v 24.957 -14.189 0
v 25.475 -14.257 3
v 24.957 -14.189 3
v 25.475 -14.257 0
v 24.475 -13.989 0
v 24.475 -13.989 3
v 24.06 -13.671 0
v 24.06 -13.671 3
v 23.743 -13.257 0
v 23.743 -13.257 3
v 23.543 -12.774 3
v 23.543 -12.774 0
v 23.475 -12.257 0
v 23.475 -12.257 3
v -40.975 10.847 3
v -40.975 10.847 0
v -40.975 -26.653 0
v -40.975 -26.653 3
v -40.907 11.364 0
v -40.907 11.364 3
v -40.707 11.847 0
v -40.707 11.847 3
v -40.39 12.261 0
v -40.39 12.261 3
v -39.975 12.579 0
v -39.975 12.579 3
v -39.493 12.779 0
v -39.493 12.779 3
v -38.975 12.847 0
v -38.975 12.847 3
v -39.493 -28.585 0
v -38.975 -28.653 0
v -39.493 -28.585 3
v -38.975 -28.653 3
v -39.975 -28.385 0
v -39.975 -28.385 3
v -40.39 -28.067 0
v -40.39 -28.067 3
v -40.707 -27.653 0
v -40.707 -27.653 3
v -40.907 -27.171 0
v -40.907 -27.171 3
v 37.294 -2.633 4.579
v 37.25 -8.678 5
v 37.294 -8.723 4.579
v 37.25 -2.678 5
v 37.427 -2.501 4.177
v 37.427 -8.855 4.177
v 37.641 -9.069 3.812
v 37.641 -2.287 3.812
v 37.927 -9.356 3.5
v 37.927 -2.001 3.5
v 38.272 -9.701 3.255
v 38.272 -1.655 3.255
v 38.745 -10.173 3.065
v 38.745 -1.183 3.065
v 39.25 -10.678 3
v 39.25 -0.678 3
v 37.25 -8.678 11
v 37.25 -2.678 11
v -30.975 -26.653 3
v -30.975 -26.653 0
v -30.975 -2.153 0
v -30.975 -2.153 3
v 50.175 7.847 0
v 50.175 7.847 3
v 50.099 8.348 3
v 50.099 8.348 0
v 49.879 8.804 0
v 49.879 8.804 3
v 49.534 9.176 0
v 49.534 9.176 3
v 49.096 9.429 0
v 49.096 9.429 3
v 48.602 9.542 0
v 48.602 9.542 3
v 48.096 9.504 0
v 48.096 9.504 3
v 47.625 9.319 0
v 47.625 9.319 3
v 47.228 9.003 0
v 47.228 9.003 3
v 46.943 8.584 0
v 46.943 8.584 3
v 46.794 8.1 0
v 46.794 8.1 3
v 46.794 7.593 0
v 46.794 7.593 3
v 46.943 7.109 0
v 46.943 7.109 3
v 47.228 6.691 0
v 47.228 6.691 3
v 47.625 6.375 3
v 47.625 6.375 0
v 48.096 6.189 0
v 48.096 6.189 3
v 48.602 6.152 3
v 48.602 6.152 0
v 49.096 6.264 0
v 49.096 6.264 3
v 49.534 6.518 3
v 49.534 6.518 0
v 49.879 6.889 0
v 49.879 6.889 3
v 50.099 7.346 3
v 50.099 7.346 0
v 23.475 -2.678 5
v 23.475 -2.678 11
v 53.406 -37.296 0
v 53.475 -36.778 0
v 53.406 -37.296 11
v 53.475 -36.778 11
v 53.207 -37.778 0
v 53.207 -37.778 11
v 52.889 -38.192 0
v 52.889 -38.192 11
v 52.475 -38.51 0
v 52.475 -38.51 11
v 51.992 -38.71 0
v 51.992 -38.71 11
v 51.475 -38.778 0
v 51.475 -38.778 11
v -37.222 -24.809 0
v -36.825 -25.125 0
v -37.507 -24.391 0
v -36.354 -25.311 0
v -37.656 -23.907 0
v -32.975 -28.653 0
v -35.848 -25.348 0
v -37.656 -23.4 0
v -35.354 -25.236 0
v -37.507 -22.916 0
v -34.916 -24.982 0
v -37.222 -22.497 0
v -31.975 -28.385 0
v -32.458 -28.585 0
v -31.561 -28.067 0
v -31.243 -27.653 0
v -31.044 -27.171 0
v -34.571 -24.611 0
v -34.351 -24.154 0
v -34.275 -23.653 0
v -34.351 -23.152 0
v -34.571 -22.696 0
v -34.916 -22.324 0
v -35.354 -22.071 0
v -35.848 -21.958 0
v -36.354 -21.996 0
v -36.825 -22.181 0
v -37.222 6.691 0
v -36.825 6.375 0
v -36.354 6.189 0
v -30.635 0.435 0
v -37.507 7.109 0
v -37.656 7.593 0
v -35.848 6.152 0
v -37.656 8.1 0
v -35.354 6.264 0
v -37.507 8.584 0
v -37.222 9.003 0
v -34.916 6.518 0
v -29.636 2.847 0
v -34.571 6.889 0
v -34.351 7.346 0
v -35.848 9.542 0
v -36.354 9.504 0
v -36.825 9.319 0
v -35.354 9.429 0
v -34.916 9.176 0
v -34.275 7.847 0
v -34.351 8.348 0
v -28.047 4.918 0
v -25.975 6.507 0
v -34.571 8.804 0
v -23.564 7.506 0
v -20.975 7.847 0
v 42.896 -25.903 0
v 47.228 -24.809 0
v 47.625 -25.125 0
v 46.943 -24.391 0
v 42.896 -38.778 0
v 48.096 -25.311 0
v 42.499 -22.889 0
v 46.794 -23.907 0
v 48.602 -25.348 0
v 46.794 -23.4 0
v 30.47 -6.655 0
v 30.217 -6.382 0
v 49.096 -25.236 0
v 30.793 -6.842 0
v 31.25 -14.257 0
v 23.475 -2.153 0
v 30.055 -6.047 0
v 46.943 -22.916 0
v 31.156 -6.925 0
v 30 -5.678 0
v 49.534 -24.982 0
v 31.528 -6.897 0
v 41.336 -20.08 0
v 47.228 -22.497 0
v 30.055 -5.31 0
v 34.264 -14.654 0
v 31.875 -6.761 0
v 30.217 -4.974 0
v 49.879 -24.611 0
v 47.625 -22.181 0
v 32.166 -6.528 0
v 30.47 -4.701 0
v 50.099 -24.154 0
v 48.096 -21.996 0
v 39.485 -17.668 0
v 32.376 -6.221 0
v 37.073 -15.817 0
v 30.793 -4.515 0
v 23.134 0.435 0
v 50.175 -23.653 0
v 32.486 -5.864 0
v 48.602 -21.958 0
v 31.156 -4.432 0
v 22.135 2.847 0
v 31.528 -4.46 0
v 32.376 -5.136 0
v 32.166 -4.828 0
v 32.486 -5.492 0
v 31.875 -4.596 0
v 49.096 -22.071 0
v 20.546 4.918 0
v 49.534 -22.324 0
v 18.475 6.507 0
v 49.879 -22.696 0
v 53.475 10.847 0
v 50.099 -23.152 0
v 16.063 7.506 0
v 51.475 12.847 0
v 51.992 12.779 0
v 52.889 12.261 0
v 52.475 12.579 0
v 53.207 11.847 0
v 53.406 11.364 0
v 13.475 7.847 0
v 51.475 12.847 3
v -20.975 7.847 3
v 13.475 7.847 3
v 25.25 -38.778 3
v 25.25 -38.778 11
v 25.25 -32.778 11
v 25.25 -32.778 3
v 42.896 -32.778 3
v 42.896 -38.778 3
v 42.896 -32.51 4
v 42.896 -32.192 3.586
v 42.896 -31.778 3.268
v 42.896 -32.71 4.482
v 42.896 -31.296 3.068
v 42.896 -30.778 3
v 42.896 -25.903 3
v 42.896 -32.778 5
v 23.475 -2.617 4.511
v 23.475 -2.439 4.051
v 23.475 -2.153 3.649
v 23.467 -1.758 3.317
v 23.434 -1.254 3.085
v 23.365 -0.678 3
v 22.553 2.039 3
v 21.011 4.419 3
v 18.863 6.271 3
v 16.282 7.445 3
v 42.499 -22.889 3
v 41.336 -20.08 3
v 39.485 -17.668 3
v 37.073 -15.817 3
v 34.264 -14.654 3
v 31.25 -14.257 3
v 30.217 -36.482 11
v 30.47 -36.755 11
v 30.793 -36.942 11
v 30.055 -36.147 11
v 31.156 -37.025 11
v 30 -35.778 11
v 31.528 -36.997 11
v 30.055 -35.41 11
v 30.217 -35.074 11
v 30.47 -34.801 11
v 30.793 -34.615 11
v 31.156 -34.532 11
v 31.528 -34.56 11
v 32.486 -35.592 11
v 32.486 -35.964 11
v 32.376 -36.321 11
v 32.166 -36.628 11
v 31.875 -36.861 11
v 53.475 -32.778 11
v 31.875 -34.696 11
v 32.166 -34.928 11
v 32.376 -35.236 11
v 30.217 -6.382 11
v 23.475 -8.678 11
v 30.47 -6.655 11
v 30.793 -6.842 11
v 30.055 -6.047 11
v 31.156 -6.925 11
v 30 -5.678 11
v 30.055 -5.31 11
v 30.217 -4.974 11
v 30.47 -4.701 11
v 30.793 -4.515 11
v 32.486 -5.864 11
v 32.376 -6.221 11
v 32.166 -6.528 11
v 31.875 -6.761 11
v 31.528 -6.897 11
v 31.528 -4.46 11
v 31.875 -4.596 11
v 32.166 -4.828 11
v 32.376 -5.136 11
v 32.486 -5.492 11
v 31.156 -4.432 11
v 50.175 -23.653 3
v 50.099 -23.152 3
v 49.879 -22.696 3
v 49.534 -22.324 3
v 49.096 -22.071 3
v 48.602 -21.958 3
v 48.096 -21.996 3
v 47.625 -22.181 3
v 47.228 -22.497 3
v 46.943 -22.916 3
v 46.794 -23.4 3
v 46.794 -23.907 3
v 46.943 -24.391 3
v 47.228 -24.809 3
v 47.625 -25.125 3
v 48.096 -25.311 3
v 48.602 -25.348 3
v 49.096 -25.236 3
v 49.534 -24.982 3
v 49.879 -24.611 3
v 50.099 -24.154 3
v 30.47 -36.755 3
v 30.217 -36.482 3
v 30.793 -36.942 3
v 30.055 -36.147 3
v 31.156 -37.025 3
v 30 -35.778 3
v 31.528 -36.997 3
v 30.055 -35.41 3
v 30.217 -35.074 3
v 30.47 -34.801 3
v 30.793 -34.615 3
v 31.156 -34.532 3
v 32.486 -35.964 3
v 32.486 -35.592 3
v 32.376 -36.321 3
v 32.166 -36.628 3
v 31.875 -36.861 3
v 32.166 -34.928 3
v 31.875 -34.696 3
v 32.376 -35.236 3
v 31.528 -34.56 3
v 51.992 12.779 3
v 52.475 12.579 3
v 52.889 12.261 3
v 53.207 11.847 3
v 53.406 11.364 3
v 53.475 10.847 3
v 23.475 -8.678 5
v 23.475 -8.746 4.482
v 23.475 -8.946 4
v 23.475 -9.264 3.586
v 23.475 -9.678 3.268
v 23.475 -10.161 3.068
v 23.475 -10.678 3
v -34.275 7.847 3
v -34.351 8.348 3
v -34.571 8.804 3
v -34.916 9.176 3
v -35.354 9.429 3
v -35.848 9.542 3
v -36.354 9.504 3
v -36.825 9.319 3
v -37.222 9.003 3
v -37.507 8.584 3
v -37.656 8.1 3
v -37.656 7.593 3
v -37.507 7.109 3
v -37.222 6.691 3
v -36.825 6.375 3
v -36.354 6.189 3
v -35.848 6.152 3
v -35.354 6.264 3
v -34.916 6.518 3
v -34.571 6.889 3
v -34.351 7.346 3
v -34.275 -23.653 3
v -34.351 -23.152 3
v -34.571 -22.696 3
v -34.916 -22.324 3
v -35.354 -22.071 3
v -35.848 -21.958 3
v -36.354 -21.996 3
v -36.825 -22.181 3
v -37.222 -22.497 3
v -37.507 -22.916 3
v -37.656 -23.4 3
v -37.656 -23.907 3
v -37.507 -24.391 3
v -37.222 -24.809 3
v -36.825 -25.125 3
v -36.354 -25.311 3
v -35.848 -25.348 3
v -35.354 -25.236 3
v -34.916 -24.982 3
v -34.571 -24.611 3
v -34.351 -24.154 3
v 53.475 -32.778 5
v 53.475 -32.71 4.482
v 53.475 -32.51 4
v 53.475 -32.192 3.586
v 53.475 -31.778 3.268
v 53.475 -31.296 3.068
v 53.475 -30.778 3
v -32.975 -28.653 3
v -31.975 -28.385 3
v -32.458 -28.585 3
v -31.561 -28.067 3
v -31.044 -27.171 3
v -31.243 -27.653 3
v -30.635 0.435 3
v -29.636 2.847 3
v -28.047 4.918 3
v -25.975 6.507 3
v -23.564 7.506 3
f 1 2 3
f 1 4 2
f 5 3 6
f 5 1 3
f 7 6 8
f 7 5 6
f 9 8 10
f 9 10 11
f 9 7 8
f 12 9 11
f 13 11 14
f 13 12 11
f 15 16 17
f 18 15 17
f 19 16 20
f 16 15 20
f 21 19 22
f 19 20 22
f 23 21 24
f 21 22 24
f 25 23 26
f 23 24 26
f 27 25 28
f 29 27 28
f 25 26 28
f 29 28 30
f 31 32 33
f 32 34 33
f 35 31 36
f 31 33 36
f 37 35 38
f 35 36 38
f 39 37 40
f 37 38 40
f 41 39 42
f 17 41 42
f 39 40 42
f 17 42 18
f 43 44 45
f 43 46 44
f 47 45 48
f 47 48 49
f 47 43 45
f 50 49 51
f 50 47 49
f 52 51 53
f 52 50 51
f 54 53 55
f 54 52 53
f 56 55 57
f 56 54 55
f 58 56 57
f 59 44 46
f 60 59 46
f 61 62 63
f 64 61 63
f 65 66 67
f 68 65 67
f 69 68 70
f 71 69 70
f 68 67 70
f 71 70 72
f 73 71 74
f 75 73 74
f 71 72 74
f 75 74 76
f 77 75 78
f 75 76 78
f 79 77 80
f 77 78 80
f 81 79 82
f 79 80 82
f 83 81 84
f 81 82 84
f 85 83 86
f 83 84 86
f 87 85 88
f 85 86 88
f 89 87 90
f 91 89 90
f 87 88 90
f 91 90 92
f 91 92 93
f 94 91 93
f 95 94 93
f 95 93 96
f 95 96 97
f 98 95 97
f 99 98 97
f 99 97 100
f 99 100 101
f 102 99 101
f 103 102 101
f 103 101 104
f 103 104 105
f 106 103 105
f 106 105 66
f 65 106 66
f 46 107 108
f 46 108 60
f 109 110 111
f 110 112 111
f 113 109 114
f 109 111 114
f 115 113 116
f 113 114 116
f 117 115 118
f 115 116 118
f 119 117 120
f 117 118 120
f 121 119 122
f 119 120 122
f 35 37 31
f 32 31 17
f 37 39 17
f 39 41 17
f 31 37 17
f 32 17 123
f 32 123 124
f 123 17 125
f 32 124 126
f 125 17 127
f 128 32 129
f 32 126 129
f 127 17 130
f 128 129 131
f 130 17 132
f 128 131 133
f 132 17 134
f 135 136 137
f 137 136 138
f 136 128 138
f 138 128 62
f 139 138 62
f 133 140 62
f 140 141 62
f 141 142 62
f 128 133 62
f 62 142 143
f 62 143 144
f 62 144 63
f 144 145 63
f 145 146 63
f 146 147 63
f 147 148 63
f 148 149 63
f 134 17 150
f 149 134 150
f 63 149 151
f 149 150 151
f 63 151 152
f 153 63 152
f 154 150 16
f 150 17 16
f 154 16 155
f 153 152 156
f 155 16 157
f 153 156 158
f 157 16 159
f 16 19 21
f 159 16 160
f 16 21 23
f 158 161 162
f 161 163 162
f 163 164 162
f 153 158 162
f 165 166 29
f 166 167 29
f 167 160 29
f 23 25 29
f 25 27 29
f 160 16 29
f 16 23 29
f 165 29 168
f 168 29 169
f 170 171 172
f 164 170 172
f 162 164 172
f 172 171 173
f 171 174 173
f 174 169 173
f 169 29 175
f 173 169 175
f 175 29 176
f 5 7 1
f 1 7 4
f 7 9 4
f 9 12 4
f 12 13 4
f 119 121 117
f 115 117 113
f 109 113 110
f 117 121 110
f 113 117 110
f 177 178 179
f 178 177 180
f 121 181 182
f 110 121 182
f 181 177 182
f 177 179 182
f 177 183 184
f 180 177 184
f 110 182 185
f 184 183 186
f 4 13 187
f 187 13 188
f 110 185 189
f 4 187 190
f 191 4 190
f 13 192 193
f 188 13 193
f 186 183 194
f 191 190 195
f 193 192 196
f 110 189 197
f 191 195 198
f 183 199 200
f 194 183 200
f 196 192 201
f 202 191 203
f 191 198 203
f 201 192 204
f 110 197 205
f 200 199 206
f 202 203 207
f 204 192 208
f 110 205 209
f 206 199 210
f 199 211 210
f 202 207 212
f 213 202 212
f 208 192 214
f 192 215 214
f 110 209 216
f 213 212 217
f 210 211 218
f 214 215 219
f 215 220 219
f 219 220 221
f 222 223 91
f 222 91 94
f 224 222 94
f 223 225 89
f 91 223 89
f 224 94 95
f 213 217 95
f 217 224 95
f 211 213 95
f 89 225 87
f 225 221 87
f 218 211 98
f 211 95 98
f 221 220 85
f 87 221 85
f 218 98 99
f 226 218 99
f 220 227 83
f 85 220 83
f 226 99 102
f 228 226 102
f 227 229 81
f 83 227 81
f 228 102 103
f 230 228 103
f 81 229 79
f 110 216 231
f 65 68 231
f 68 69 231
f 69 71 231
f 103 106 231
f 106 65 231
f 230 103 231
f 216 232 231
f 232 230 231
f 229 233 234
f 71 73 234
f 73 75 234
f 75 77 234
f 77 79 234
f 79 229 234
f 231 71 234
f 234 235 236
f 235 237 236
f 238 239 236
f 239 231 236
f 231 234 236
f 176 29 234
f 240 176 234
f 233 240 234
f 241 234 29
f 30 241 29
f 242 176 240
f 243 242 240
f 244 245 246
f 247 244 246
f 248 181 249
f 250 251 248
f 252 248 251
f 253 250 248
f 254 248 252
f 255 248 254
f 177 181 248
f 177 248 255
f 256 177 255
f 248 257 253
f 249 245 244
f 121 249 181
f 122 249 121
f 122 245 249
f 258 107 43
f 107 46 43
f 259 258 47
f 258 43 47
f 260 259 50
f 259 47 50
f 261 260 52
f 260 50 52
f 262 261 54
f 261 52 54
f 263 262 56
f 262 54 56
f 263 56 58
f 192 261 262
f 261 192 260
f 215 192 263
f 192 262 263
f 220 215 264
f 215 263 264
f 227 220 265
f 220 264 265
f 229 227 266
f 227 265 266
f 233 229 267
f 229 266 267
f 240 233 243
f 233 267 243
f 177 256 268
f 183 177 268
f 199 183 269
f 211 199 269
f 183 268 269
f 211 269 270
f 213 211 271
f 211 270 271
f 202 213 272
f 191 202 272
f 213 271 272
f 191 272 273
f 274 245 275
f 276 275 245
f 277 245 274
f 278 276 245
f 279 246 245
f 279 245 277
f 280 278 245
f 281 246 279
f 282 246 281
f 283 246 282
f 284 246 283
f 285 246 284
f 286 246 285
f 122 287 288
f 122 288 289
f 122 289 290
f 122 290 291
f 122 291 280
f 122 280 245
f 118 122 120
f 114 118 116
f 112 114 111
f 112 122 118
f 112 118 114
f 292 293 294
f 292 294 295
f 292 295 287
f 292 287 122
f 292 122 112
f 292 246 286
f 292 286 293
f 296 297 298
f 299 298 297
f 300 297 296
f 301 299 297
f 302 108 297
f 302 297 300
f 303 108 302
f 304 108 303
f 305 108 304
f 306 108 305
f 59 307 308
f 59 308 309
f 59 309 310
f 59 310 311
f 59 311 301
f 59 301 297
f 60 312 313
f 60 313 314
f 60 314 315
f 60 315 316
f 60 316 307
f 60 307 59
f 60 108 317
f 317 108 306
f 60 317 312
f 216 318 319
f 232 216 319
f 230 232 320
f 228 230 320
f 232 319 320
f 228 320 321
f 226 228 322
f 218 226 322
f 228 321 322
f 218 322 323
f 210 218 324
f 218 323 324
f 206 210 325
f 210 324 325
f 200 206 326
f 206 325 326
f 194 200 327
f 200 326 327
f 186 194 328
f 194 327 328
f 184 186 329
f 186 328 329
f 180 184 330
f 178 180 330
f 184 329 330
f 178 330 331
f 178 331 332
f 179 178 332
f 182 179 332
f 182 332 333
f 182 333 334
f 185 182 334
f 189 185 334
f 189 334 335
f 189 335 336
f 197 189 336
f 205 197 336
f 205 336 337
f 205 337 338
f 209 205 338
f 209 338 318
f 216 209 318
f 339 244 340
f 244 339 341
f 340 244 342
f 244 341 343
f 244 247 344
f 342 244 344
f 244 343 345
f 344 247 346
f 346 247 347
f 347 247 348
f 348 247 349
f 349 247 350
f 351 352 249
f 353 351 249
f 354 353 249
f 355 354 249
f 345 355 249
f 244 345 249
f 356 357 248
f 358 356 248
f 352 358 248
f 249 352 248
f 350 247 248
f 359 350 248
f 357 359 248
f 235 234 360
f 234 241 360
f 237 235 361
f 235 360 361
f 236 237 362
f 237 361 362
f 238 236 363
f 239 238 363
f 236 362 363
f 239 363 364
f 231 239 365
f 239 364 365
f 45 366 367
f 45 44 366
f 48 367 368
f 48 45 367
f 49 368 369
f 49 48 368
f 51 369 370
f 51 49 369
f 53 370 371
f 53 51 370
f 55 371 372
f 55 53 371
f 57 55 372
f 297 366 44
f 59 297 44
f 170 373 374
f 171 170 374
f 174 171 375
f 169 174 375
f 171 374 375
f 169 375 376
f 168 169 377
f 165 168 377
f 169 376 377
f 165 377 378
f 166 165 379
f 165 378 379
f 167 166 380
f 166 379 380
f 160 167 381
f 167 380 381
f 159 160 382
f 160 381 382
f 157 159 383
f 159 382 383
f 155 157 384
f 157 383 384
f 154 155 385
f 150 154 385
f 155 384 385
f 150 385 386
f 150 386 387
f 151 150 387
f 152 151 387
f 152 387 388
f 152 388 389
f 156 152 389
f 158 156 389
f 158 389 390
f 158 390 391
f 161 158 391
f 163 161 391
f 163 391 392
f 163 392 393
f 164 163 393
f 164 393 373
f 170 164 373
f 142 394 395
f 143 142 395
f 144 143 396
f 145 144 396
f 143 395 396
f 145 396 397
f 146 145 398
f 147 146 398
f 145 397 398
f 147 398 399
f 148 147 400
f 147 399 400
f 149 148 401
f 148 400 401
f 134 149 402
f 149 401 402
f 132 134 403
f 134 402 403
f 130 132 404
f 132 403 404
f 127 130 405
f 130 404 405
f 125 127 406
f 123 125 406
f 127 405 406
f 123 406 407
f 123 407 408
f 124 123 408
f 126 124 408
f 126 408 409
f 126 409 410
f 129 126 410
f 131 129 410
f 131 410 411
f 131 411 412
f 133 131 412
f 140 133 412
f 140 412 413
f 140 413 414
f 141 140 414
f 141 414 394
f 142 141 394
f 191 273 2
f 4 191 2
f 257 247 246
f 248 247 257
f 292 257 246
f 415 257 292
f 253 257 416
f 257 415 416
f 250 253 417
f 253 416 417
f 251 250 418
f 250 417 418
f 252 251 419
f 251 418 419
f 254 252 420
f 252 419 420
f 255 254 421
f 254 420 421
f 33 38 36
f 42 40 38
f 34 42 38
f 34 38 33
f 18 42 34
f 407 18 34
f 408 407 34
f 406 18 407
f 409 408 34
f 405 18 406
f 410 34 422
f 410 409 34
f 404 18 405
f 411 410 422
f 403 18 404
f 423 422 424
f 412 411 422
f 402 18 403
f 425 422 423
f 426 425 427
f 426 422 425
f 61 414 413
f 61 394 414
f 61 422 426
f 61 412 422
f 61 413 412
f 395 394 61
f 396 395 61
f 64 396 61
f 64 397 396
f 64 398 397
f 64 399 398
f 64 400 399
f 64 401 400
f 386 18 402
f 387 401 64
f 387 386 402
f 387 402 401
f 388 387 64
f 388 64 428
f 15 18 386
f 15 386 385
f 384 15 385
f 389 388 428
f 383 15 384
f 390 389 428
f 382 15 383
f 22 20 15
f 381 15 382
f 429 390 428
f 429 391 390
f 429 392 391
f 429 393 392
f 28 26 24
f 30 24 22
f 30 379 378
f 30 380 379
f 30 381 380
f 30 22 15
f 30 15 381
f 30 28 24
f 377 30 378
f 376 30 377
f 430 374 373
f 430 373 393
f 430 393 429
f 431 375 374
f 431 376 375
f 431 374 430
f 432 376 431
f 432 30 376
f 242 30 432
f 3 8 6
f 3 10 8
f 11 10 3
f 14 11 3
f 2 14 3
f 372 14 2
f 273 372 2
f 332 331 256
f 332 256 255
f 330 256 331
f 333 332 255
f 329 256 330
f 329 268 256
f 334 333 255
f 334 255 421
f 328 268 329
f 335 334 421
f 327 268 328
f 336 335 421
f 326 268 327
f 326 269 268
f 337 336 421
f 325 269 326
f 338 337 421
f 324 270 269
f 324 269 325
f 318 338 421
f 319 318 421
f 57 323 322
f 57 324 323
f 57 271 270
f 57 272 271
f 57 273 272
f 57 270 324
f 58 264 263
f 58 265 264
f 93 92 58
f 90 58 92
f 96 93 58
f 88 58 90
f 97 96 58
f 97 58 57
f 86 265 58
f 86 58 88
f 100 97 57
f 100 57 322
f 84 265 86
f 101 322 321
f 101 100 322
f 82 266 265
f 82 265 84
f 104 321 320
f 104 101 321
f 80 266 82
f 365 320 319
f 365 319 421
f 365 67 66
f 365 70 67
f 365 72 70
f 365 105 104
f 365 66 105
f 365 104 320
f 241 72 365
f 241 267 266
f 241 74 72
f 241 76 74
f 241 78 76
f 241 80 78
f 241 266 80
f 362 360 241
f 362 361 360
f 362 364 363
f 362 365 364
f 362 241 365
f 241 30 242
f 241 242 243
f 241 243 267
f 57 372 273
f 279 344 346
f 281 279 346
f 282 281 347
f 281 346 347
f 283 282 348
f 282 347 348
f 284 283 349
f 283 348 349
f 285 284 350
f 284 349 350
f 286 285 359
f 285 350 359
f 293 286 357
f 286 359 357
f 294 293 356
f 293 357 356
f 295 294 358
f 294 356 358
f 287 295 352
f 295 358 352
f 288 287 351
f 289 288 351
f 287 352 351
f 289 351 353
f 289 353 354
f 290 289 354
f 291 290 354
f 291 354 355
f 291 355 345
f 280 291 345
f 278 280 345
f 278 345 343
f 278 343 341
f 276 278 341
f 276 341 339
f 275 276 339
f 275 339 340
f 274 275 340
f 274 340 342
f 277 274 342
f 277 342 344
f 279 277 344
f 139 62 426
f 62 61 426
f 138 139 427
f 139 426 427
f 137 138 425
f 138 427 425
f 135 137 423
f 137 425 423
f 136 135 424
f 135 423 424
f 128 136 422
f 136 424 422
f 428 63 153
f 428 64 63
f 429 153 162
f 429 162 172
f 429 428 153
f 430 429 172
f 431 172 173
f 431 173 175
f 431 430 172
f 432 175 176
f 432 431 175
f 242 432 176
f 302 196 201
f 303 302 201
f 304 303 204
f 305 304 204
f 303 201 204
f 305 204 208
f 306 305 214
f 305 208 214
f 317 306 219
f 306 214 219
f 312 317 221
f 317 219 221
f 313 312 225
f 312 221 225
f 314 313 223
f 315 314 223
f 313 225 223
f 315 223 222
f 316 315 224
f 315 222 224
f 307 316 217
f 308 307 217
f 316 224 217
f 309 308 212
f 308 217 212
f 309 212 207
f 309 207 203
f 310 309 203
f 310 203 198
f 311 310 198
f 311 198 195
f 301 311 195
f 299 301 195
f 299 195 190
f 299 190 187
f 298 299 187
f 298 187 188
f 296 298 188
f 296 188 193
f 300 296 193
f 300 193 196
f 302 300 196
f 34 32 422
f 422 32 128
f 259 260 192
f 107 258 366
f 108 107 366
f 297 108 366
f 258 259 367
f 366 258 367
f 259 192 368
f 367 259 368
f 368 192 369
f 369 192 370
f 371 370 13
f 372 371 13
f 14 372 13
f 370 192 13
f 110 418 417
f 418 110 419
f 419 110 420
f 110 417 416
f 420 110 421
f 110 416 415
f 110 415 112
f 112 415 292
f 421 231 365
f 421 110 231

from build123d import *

# Parameters (mm, degrees)
BOSS_EXTRUDE1_DEPTH         = 3
FILLET1_R                   = 10
M3_CLEARANCE_HOLE1_D        = 3.4
CUT_EXTRUDE1_DEPTH          = 61.741531853
SKETCH7_W                   = 13.775
SKETCH7_H                   = 6
SKETCH7_W_2                 = 28.225
BOSS_EXTRUDE2_DEPTH         = 8
SKETCH15_W                  = 10.578557518
SKETCH15_H                  = 3
BOSS_EXTRUDE3_DEPTH         = 10.125
FILLET2_R                   = 2
TAP_DRILL_FOR_M3X0_5_TAP1_D = 2.5


with BuildPart() as part:
    # Sketch1 → Boss-Extrude1 (new body)
    with BuildSketch(Plane.XY):
        Polygon((23.474558014, 7.846809304), (23.474558014, -28.653190696), (53.474558014, -28.653190696), (53.474558014, 12.846809304), (-40.975441986, 12.846809304), (-40.975441986, -28.653190696), (-30.975441986, -28.653190696), (-30.975441986, 7.846809304), align=None)
    extrude(amount=BOSS_EXTRUDE1_DEPTH)

    # Fillet1
    fillet1_edges = [part.edges().sort_by_distance(p)[0] for p in [
        (23.474558014, 7.846809304, 1.5),
        (-30.975441986, 7.846809304, 1.5),
    ]]
    fillet(fillet1_edges, radius=FILLET1_R)

    # M3 Clearance Hole1 (through all)
    with Locations(Plane(origin=(0, 0, 0), x_dir=(-1, 0, 0), z_dir=(0, 0, -1))):
        with Locations((-48.474558014, 7.846809304), (35.975441986, -23.653190696), (35.975441986, 7.846809304), (-48.474558014, -23.653190696), (-29.467521423, -37.965948117)):
            Hole(M3_CLEARANCE_HOLE1_D / 2)

    # Sketch5 → Cut-Extrude1 (cut, through all)
    with BuildSketch(Plane.XY.offset(3)):
        with BuildLine():
            Line((23.474558014, -14.256748214), (23.474558014, -17.232031749))
            ThreePointArc((23.474558014, -17.232031749), (25.270647998, -35.897802119), (42.566674364, -28.653190696))
            Line((42.566674364, -28.653190696), (42.896000496, -28.653190696))
            Line((42.896000496, -28.653190696), (42.896000496, -25.903190696))
            ThreePointArc((42.896000496, -25.903190696), (39.48483647, -17.667912241), (31.249558014, -14.256748214))
            Line((31.249558014, -14.256748214), (23.474558014, -14.256748214))
        make_face()
    extrude(amount=-CUT_EXTRUDE1_DEPTH, mode=Mode.SUBTRACT)

    # Sketch7 → Boss-Extrude2 (add)
    with BuildSketch(Plane.XY.offset(3)):
        with Locations((30.362058014, -5.678190696)):
            Rectangle(SKETCH7_W, SKETCH7_H)
        with Locations((39.362058014, -35.778190696)):
            Rectangle(SKETCH7_W_2, SKETCH7_H)
    extrude(amount=BOSS_EXTRUDE2_DEPTH)


with BuildPart() as boss_extrude2_piece_1:
    # of the separate pieces the step leaves, piece 1, a body of its own (boss_extrude2_pieces)
    add(part.part.solids().sort_by_distance((-20.975441986, 7.846809304, 0))[0])



with BuildPart() as boss_extrude2_piece_2:
    # of the separate pieces the step leaves, piece 2, a body of its own (boss_extrude2_pieces)
    add(part.part.solids().sort_by_distance((53.474558014, -38.778190696, 3))[0])


with BuildPart() as boss_extrude2_piece_1_1:
    add(boss_extrude2_piece_1.part)

    add(boss_extrude2_piece_2.part)  # Boss-Extrude3 merges Boss-Extrude2 piece 2
    # Sketch15 → Boss-Extrude3 (add)
    with BuildSketch(Plane.XZ.offset(28.653190696)):
        with Locations((48.185279255, 1.5)):
            Rectangle(SKETCH15_W, SKETCH15_H)
    extrude(amount=BOSS_EXTRUDE3_DEPTH)

    # Fillet2
    fillet2_edges = [boss_extrude2_piece_1_1.edges().sort_by_distance(p)[0] for p in [
        (53.474558014, -38.778190696, 5.5),
        (48.185279255, -32.778190696, 3),
        (-40.975441986, -28.653190696, 1.5),
        (-40.975441986, 12.846809304, 1.5),
        (53.474558014, 12.846809304, 1.5),
        (-30.975441986, -28.653190696, 1.5),
        (23.474558014, -14.256748214, 1.5),
        (30.362058014, -2.678190696, 3),
        (37.249558014, -5.678190696, 3),
        (30.362058014, -8.678190696, 3),
    ]]
    fillet(fillet2_edges, radius=FILLET2_R)

    # Tap Drill for M3x0.5 Tap1 (through all)
    with Locations(Plane.XY.offset(11)):
        with Locations((31.249558014, -35.778190696), (31.249558014, -5.678190696)):
            Hole(TAP_DRILL_FOR_M3X0_5_TAP1_D / 2)


solid = boss_extrude2_piece_1_1.part
